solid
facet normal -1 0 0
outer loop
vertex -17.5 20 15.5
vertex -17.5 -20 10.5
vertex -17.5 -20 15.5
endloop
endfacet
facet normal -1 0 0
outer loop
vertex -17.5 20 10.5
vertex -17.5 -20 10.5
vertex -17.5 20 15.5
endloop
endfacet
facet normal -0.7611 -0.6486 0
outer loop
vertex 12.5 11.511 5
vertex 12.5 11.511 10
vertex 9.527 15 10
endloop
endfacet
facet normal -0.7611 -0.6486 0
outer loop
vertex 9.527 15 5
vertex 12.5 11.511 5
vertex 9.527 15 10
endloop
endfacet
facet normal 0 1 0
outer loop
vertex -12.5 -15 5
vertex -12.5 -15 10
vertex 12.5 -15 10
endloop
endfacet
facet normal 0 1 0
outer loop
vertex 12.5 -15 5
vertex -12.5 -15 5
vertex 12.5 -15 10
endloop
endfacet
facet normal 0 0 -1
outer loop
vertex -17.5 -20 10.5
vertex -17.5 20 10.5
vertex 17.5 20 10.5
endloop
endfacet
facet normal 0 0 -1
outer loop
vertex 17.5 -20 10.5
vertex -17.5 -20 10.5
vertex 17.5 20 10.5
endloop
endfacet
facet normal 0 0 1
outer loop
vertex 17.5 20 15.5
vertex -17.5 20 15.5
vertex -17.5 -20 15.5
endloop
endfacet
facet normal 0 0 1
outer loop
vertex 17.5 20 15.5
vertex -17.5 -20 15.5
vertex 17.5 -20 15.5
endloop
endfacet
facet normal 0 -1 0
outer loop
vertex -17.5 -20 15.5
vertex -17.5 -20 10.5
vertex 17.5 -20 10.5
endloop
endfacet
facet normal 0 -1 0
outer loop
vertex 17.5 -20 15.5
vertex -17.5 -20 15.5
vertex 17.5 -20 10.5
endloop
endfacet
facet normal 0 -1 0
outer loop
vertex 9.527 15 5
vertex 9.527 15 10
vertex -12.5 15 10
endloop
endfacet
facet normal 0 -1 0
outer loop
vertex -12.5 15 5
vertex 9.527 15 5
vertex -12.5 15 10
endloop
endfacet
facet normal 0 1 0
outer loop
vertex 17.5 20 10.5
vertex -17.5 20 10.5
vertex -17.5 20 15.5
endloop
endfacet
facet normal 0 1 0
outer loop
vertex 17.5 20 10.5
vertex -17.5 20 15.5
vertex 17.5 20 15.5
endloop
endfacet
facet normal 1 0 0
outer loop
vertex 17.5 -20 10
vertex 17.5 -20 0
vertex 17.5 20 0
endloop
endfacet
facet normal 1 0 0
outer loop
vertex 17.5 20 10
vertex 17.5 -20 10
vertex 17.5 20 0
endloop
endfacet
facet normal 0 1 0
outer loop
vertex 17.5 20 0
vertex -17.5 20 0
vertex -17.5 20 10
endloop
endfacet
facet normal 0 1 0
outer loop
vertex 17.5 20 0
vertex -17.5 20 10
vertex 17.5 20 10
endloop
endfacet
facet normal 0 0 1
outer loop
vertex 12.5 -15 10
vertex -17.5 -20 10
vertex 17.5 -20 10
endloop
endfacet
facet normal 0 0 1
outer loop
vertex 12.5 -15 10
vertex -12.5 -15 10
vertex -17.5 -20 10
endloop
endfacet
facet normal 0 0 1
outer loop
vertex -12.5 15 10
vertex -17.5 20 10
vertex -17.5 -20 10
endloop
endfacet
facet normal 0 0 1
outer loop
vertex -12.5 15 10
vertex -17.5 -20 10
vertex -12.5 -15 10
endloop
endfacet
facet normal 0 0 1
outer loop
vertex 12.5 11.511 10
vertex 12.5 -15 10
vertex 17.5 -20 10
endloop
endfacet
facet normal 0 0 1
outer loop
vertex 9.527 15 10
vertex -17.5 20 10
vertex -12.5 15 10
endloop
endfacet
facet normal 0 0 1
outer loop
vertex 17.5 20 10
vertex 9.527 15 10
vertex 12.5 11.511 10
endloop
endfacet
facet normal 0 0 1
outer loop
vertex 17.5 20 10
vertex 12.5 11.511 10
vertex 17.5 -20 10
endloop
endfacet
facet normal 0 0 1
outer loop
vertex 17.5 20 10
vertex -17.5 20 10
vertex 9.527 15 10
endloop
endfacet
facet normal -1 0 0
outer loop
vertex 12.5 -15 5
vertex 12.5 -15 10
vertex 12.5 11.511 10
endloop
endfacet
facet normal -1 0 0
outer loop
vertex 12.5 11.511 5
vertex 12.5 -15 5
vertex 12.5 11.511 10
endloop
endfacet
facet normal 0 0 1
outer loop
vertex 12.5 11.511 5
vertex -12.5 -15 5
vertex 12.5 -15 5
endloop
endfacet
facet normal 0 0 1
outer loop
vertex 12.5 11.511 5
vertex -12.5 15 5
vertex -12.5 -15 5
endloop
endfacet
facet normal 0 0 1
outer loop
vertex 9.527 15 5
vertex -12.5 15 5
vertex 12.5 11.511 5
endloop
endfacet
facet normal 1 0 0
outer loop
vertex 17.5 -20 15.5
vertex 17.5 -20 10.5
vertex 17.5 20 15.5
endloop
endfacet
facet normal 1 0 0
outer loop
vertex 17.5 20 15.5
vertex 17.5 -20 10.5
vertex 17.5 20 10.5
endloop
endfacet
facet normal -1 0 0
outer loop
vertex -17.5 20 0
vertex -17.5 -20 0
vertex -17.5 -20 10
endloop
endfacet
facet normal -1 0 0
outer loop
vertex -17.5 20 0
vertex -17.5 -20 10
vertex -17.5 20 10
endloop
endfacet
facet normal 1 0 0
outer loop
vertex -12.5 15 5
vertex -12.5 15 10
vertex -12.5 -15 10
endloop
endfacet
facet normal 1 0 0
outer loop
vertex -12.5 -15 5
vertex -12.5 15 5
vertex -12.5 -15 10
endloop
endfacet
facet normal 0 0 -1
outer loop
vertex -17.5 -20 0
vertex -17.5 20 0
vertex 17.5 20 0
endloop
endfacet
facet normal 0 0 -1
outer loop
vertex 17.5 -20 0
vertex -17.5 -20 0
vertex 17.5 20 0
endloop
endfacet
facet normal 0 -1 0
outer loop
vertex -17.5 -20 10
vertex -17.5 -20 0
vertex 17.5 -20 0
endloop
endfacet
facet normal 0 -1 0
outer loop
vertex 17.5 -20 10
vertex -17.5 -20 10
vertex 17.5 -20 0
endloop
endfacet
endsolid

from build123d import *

# Parameters (mm, degrees)
F0_W     = 35
F0_H     = 40
F1_DEPTH = 10
F3_DEPTH = 5
F5_W     = 35
F5_H     = 40
F6_DEPTH = 5


with BuildPart() as f1:
    # F0 (on Top) → F1 (new body)
    with BuildSketch(Plane.XY):
        Rectangle(F0_W, F0_H)
    extrude(amount=F1_DEPTH)

    # F2 (on face) → F3 (cut)
    with BuildSketch(Plane.XY.offset(10)):
        Polygon((-12.5, -15), (12.5, -15), (12.5, 11.5108080208), (9.5269214362, 15), (-12.5, 15), align=None)
    extrude(amount=-F3_DEPTH, mode=Mode.SUBTRACT)


with BuildPart() as f6:
    # F5 (on offset) → F6 (new body)
    with BuildSketch(Plane.XY.offset(10.5)):
        Rectangle(F5_W, F5_H)
    extrude(amount=F6_DEPTH)


solid = Compound([f1.part, f6.part])
